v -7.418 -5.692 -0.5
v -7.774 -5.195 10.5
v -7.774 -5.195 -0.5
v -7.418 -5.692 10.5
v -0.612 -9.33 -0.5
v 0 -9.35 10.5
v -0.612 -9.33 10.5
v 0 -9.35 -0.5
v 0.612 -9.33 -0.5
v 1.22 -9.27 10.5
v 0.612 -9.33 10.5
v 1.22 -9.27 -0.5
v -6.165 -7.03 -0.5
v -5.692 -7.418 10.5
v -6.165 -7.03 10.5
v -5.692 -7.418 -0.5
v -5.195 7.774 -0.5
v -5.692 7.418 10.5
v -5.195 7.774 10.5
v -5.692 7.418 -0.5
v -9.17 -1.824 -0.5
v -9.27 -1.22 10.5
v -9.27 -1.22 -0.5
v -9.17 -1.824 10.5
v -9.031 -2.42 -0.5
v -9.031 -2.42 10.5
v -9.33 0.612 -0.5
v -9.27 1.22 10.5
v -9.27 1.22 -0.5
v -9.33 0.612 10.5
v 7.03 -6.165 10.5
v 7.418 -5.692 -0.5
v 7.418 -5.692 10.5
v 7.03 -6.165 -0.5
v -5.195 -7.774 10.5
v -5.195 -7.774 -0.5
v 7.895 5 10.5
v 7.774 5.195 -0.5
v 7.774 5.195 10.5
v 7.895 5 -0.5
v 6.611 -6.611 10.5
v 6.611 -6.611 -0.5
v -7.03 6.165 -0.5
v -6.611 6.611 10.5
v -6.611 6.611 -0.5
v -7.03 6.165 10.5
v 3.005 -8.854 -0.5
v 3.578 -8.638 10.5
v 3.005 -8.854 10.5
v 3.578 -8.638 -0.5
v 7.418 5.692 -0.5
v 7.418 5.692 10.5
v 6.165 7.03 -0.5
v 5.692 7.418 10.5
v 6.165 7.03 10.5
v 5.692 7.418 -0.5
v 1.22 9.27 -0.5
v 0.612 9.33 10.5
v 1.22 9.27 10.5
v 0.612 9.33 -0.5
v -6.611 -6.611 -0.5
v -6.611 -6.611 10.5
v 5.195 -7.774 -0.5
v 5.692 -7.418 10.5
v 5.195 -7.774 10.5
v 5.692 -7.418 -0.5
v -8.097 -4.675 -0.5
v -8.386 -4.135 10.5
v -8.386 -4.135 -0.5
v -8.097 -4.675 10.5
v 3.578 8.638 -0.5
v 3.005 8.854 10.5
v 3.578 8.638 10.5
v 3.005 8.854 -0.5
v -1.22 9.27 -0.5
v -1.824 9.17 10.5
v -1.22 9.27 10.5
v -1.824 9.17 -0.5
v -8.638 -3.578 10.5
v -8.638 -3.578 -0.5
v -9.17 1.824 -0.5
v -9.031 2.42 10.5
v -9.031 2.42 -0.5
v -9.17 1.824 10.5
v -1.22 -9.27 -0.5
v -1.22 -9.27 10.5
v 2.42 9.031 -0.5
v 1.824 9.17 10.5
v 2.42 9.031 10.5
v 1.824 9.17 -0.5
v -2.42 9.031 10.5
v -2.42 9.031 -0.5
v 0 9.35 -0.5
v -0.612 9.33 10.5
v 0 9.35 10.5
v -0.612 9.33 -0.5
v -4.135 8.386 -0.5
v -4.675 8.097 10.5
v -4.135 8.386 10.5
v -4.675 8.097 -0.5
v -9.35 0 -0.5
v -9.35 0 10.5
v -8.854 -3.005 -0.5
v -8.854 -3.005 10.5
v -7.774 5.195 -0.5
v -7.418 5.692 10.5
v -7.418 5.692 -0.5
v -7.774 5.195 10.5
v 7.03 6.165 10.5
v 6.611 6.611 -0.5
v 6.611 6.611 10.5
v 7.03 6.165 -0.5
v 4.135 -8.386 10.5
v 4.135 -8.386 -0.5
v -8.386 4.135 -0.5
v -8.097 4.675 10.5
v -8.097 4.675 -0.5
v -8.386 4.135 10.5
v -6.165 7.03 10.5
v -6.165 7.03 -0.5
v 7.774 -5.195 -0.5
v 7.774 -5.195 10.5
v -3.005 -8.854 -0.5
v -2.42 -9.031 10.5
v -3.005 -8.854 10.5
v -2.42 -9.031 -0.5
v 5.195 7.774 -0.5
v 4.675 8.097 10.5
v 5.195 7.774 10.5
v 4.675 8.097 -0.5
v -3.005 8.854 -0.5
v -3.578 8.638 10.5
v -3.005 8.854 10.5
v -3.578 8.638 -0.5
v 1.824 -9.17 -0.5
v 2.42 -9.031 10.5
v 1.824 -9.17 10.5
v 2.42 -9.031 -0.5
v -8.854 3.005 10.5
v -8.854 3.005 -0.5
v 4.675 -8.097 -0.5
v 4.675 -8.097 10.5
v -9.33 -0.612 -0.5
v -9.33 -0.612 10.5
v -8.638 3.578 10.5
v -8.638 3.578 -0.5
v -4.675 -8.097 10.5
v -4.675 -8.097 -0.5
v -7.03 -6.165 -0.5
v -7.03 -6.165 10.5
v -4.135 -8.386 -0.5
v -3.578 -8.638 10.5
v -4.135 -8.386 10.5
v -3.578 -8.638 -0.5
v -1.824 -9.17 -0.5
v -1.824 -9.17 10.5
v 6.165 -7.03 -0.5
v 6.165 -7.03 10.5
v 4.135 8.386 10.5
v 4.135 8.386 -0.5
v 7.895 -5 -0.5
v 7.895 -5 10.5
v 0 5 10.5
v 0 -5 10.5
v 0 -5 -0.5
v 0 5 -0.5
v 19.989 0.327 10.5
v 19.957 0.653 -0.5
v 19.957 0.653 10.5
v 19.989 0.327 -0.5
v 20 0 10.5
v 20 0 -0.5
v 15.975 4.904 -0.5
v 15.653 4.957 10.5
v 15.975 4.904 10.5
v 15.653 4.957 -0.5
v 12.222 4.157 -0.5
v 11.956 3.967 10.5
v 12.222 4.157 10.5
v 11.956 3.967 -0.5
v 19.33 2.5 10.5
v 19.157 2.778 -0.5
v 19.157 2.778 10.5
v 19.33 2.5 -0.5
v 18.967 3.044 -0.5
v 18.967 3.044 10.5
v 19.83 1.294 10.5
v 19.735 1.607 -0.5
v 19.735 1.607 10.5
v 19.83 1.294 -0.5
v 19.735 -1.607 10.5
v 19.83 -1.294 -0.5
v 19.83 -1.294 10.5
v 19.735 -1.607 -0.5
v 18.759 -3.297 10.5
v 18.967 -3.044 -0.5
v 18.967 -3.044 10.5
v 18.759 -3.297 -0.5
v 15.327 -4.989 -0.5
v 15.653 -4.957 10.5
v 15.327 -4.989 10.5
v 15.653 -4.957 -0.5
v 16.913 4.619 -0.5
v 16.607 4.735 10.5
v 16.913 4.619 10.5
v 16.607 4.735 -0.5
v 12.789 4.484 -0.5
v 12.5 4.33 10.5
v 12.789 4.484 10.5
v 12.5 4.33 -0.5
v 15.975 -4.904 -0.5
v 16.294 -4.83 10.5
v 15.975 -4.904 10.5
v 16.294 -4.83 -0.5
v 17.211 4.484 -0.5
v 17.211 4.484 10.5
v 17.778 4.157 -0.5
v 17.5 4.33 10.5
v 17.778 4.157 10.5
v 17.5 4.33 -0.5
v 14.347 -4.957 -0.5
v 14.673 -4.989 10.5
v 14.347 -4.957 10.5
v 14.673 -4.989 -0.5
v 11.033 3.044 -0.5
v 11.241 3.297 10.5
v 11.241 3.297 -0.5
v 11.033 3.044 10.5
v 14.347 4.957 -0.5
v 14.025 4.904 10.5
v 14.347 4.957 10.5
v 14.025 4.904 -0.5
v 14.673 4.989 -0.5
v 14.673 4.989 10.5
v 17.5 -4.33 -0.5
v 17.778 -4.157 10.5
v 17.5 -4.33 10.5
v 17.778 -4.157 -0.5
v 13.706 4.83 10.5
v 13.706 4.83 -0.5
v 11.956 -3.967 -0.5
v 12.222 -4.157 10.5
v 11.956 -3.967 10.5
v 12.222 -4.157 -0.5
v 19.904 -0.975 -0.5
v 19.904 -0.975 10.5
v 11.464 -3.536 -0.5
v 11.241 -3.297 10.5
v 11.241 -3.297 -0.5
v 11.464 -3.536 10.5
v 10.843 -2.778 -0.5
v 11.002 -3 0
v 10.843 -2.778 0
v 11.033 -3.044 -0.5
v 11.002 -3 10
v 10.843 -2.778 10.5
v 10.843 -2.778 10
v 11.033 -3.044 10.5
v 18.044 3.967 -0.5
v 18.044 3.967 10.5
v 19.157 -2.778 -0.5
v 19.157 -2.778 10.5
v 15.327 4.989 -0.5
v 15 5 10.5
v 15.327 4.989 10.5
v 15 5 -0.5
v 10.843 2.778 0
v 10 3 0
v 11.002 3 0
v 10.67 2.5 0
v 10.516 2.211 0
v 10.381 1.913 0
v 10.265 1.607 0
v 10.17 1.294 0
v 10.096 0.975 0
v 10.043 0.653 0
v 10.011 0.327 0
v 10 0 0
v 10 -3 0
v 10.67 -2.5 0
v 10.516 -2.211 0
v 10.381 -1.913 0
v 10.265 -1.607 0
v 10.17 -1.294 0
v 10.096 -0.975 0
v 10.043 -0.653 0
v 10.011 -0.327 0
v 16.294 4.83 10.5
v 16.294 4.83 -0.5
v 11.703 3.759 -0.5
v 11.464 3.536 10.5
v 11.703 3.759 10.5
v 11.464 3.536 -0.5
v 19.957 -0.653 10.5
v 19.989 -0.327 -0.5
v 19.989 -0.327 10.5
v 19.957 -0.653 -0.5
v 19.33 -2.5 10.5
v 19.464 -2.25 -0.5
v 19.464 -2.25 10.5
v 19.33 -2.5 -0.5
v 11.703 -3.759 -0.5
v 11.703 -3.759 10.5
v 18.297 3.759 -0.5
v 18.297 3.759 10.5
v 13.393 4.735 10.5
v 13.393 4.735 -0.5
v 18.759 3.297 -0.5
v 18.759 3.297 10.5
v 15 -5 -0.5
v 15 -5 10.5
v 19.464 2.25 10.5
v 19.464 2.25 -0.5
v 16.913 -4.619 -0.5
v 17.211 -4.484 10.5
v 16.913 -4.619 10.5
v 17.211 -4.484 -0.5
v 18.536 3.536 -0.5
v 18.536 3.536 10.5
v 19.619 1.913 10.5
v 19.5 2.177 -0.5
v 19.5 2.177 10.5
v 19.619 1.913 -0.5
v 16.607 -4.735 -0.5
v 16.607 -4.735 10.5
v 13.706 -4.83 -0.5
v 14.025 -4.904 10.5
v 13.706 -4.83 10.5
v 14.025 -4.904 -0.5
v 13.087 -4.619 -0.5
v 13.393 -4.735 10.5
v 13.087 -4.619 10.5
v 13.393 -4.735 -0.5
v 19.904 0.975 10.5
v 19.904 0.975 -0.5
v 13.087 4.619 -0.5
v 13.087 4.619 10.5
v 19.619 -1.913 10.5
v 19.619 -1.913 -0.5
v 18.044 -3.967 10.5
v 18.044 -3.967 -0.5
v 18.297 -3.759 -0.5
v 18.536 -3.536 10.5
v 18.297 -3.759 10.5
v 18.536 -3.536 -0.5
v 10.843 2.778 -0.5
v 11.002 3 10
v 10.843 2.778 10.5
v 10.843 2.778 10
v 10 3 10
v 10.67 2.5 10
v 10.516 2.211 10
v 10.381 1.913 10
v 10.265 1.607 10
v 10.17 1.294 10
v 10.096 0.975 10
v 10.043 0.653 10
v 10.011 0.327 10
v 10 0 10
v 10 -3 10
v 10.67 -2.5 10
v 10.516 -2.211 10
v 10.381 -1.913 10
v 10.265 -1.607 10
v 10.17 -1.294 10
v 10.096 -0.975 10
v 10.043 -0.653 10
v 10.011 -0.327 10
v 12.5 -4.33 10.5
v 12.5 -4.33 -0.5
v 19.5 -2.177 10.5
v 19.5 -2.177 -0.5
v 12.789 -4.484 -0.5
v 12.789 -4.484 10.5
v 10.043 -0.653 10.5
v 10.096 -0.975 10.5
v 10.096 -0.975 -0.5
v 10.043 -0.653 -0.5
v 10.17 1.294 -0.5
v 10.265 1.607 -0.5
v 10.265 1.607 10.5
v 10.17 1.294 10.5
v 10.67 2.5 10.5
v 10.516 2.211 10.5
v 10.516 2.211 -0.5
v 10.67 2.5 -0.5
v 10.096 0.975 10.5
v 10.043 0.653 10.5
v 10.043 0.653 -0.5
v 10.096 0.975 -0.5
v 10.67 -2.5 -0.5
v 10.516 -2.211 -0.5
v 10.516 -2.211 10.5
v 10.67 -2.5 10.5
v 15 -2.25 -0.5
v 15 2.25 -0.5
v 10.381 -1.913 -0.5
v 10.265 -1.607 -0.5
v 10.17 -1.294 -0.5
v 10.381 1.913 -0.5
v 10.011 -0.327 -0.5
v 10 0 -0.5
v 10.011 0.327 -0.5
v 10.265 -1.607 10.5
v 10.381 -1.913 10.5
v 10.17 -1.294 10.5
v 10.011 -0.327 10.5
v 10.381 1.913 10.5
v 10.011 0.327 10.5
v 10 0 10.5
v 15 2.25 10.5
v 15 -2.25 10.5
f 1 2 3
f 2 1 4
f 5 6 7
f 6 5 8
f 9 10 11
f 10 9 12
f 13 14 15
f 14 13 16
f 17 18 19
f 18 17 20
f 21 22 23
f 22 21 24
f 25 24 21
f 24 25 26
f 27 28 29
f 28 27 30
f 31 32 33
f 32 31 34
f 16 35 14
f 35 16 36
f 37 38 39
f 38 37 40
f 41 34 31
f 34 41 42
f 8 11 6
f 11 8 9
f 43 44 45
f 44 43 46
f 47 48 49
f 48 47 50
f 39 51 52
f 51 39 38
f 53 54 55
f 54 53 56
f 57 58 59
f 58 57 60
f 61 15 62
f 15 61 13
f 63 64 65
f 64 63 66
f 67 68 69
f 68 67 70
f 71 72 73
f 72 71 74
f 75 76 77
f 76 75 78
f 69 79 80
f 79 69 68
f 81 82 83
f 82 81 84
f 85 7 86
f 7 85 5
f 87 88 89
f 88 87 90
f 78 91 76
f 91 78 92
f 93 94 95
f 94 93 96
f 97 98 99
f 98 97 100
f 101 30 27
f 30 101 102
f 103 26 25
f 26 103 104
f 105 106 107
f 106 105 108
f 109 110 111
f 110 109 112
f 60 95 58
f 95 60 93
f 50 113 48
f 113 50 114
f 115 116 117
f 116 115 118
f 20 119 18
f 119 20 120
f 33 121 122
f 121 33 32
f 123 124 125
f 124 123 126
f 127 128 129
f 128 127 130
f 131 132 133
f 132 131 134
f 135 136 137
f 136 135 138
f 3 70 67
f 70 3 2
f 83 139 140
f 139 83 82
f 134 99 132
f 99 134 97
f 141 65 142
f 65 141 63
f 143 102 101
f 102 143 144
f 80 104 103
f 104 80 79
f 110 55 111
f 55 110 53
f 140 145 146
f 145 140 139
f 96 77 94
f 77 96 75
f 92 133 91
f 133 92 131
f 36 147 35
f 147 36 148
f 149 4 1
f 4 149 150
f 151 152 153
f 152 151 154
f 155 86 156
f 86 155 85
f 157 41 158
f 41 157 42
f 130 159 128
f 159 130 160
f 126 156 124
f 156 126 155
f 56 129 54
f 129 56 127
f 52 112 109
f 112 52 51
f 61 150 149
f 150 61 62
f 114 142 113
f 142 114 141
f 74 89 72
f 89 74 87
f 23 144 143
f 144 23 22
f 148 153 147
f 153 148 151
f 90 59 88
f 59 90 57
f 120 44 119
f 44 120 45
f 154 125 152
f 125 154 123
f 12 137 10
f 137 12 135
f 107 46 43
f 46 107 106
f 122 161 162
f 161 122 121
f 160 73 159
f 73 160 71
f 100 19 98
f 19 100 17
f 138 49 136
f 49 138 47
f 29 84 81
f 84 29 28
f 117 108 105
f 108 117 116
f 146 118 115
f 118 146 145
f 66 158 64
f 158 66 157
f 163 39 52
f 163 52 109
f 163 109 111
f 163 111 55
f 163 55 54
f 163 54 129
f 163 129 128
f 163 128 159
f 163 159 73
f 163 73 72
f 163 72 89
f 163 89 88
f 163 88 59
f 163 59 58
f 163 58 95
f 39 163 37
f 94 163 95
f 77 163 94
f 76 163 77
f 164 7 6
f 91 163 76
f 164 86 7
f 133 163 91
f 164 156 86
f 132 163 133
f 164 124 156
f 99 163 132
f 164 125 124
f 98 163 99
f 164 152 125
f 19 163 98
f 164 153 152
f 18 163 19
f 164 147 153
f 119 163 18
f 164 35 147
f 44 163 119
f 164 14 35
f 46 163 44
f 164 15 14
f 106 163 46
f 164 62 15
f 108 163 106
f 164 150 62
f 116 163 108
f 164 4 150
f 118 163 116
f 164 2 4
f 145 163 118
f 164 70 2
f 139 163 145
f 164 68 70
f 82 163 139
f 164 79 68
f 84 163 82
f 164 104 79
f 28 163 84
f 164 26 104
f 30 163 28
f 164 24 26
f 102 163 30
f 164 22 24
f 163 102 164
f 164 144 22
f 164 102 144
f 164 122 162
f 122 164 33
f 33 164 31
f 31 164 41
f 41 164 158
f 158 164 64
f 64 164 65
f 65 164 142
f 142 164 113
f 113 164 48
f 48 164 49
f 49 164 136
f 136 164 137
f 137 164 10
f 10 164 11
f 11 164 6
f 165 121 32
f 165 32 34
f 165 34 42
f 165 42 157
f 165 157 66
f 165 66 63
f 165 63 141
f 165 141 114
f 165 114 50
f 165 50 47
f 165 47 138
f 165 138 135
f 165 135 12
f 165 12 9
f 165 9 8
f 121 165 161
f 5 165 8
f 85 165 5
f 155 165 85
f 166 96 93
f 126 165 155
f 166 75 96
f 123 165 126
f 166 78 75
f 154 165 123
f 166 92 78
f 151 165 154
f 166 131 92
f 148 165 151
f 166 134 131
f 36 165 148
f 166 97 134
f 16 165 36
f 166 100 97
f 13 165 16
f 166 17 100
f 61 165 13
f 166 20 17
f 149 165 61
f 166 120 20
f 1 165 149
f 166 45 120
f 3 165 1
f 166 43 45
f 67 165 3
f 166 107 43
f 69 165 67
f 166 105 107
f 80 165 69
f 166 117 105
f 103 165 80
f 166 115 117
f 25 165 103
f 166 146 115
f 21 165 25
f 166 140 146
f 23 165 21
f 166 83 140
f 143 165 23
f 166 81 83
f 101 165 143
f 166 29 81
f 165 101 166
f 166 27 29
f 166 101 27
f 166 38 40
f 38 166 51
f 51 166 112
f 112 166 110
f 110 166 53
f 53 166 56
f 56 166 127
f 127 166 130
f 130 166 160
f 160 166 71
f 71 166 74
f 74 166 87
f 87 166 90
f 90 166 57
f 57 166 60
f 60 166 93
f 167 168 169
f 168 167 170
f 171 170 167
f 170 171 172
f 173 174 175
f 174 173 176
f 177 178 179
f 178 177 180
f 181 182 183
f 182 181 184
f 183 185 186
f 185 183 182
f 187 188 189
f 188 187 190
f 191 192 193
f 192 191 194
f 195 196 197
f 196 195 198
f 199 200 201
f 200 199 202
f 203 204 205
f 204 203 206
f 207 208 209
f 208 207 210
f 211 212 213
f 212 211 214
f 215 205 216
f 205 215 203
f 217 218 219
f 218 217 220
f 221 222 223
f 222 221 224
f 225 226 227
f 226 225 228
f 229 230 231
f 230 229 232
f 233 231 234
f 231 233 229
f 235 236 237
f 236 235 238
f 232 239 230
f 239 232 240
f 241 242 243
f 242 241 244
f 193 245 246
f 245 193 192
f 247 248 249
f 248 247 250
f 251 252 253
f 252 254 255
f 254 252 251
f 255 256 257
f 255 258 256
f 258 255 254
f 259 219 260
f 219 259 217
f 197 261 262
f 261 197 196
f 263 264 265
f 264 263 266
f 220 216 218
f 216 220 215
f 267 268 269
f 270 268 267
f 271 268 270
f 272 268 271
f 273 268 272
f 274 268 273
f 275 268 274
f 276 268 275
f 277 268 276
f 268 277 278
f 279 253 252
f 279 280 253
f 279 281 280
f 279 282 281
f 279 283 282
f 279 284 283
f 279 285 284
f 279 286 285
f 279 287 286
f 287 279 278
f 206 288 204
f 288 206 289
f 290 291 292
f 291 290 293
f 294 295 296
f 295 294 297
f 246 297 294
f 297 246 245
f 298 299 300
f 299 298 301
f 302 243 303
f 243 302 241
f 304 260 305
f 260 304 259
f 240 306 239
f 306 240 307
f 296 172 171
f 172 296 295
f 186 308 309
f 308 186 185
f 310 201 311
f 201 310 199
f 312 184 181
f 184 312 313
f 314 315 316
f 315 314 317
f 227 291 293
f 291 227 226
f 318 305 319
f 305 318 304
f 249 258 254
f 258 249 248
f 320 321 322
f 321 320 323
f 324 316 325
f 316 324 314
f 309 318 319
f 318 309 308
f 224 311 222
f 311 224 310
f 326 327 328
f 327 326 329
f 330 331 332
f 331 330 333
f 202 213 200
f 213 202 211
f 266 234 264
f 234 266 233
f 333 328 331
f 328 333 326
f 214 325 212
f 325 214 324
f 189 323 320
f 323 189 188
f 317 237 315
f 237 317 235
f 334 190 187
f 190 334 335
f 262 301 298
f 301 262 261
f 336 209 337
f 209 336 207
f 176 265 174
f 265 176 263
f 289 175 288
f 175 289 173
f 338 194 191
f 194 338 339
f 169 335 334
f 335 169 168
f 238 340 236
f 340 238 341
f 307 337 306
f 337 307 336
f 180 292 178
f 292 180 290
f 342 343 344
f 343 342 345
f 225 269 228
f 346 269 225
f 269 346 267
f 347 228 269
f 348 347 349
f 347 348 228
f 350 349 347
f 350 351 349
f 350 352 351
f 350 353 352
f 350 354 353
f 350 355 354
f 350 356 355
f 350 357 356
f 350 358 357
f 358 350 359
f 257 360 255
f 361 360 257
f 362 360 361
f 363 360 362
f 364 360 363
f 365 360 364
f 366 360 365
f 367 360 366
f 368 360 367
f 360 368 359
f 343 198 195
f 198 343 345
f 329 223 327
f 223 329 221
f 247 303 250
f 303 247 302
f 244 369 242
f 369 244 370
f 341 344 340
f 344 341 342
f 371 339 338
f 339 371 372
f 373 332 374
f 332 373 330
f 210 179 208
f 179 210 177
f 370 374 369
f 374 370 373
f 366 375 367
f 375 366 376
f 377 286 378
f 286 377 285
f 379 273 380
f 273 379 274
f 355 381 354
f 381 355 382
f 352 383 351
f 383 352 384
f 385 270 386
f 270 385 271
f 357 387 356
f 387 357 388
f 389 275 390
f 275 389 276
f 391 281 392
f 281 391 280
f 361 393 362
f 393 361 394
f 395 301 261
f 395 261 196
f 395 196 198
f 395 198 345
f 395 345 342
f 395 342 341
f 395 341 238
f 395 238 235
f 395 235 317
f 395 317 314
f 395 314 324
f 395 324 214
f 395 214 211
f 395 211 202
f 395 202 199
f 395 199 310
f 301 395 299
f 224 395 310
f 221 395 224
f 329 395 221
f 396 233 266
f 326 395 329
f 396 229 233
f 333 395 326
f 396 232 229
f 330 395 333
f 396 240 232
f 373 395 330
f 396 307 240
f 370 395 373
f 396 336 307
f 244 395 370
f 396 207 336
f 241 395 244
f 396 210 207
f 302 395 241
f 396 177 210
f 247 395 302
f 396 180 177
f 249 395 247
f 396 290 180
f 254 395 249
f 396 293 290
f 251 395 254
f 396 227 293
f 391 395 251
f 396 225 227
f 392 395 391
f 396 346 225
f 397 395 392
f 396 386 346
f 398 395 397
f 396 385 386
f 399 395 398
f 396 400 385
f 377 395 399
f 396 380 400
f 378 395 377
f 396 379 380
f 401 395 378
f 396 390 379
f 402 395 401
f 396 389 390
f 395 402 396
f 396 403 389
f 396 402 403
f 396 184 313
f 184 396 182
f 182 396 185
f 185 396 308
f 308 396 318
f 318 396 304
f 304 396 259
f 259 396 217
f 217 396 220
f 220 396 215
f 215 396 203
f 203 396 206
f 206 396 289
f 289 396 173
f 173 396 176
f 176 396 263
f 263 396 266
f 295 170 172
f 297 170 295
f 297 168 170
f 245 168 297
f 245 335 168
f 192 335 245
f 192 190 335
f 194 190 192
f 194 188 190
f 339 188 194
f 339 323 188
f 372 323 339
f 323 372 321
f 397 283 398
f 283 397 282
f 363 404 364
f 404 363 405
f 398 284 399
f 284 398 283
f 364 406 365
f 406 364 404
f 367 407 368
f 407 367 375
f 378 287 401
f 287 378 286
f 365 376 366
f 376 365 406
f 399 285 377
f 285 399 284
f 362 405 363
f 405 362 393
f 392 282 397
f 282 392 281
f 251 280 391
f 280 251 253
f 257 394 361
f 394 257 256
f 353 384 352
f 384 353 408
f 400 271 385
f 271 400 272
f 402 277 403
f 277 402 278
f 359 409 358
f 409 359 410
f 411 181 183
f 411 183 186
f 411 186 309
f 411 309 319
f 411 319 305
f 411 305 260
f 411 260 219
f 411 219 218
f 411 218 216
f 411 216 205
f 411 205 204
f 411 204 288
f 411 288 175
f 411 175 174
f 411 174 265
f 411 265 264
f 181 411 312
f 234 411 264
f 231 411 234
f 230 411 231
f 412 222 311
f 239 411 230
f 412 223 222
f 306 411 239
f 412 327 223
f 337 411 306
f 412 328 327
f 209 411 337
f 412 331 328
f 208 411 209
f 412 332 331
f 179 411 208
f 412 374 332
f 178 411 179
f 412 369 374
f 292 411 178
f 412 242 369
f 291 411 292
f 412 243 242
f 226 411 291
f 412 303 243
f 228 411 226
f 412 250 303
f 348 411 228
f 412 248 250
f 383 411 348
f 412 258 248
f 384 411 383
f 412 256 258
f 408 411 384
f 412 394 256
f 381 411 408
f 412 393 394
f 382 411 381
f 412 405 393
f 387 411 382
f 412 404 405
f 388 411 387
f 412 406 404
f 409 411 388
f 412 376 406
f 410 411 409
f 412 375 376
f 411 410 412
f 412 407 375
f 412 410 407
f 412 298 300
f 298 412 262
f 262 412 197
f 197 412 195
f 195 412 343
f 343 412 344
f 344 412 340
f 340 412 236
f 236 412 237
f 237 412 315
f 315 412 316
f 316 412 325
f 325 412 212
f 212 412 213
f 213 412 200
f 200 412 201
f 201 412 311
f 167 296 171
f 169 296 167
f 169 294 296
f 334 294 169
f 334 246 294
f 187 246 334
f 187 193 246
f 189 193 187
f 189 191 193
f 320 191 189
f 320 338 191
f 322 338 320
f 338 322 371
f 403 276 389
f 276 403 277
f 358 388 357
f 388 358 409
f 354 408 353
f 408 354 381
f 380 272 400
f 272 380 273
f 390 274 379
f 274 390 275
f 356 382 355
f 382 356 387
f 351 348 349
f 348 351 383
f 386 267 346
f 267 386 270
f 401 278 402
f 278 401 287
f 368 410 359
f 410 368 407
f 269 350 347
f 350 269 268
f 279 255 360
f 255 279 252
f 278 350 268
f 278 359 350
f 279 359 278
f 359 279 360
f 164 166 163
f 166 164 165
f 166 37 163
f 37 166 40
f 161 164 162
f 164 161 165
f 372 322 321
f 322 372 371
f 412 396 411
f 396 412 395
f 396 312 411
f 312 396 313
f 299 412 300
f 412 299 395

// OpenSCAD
// Lab stand rod tubing clip - printed flat, extruded in Z
// Units: mm

$fn = 96;

// --- Dimensions ---
rod_id      = 12.7;   // stand rod inner diameter
rod_wall    = 3;      // stand rod ring wall thickness
rod_od      = rod_id + 2 * rod_wall;  // 18.7 mm outer diameter
rod_opening = 10;     // width of -X side opening (y from -5 to 5)

tub_id      = 6;      // tubing inner diameter
tub_wall    = 2;      // tubing ring wall thickness
tub_od      = tub_id + 2 * tub_wall;  // 10 mm outer diameter
tub_x       = 15;     // tubing ring centre X
tub_opening = 4.5;    // width of +X side opening (y from -2.25 to 2.25)

bridge_w    = 6;      // bridge width along X (from x=8 to x=12)
bridge_y    = bridge_w;  // bridge height along Y
bridge_h    = 10;     // extrusion height in Z

eps         = 0.5;    // cutter overshoot past faces

// --- Model ---
difference() {
    union() {
        // Rod ring
        cylinder(h = bridge_h, d = rod_od);
        translate([0, 0, -eps])
            cylinder(h = bridge_h + 2 * eps, d = rod_od);

        // Tubing ring
        translate([tub_x, 0, 0])
            cylinder(h = bridge_h, d = tub_od);
        translate([tub_x, 0, -eps])
            cylinder(h = bridge_h + 2 * eps, d = tub_od);

        // Solid bridge between x = 8 and x = 12
        translate([tub_x - bridge_w, -bridge_y / 2, 0])
            cube([bridge_w, bridge_y, bridge_h]);
    }

    // Rod ring opening (x < 0, -5 < y < 5)
    translate([0, -rod_opening / 2, -eps])
        cube([rod_opening, rod_opening, bridge_h + 2 * eps]);

    // Tubing ring opening (x > 15, -2.25 < y < 2.25)
    translate([tub_x, -tub_opening / 2, -eps])
        cube([tub_opening, tub_opening, bridge_h + 2 * eps]);
}
